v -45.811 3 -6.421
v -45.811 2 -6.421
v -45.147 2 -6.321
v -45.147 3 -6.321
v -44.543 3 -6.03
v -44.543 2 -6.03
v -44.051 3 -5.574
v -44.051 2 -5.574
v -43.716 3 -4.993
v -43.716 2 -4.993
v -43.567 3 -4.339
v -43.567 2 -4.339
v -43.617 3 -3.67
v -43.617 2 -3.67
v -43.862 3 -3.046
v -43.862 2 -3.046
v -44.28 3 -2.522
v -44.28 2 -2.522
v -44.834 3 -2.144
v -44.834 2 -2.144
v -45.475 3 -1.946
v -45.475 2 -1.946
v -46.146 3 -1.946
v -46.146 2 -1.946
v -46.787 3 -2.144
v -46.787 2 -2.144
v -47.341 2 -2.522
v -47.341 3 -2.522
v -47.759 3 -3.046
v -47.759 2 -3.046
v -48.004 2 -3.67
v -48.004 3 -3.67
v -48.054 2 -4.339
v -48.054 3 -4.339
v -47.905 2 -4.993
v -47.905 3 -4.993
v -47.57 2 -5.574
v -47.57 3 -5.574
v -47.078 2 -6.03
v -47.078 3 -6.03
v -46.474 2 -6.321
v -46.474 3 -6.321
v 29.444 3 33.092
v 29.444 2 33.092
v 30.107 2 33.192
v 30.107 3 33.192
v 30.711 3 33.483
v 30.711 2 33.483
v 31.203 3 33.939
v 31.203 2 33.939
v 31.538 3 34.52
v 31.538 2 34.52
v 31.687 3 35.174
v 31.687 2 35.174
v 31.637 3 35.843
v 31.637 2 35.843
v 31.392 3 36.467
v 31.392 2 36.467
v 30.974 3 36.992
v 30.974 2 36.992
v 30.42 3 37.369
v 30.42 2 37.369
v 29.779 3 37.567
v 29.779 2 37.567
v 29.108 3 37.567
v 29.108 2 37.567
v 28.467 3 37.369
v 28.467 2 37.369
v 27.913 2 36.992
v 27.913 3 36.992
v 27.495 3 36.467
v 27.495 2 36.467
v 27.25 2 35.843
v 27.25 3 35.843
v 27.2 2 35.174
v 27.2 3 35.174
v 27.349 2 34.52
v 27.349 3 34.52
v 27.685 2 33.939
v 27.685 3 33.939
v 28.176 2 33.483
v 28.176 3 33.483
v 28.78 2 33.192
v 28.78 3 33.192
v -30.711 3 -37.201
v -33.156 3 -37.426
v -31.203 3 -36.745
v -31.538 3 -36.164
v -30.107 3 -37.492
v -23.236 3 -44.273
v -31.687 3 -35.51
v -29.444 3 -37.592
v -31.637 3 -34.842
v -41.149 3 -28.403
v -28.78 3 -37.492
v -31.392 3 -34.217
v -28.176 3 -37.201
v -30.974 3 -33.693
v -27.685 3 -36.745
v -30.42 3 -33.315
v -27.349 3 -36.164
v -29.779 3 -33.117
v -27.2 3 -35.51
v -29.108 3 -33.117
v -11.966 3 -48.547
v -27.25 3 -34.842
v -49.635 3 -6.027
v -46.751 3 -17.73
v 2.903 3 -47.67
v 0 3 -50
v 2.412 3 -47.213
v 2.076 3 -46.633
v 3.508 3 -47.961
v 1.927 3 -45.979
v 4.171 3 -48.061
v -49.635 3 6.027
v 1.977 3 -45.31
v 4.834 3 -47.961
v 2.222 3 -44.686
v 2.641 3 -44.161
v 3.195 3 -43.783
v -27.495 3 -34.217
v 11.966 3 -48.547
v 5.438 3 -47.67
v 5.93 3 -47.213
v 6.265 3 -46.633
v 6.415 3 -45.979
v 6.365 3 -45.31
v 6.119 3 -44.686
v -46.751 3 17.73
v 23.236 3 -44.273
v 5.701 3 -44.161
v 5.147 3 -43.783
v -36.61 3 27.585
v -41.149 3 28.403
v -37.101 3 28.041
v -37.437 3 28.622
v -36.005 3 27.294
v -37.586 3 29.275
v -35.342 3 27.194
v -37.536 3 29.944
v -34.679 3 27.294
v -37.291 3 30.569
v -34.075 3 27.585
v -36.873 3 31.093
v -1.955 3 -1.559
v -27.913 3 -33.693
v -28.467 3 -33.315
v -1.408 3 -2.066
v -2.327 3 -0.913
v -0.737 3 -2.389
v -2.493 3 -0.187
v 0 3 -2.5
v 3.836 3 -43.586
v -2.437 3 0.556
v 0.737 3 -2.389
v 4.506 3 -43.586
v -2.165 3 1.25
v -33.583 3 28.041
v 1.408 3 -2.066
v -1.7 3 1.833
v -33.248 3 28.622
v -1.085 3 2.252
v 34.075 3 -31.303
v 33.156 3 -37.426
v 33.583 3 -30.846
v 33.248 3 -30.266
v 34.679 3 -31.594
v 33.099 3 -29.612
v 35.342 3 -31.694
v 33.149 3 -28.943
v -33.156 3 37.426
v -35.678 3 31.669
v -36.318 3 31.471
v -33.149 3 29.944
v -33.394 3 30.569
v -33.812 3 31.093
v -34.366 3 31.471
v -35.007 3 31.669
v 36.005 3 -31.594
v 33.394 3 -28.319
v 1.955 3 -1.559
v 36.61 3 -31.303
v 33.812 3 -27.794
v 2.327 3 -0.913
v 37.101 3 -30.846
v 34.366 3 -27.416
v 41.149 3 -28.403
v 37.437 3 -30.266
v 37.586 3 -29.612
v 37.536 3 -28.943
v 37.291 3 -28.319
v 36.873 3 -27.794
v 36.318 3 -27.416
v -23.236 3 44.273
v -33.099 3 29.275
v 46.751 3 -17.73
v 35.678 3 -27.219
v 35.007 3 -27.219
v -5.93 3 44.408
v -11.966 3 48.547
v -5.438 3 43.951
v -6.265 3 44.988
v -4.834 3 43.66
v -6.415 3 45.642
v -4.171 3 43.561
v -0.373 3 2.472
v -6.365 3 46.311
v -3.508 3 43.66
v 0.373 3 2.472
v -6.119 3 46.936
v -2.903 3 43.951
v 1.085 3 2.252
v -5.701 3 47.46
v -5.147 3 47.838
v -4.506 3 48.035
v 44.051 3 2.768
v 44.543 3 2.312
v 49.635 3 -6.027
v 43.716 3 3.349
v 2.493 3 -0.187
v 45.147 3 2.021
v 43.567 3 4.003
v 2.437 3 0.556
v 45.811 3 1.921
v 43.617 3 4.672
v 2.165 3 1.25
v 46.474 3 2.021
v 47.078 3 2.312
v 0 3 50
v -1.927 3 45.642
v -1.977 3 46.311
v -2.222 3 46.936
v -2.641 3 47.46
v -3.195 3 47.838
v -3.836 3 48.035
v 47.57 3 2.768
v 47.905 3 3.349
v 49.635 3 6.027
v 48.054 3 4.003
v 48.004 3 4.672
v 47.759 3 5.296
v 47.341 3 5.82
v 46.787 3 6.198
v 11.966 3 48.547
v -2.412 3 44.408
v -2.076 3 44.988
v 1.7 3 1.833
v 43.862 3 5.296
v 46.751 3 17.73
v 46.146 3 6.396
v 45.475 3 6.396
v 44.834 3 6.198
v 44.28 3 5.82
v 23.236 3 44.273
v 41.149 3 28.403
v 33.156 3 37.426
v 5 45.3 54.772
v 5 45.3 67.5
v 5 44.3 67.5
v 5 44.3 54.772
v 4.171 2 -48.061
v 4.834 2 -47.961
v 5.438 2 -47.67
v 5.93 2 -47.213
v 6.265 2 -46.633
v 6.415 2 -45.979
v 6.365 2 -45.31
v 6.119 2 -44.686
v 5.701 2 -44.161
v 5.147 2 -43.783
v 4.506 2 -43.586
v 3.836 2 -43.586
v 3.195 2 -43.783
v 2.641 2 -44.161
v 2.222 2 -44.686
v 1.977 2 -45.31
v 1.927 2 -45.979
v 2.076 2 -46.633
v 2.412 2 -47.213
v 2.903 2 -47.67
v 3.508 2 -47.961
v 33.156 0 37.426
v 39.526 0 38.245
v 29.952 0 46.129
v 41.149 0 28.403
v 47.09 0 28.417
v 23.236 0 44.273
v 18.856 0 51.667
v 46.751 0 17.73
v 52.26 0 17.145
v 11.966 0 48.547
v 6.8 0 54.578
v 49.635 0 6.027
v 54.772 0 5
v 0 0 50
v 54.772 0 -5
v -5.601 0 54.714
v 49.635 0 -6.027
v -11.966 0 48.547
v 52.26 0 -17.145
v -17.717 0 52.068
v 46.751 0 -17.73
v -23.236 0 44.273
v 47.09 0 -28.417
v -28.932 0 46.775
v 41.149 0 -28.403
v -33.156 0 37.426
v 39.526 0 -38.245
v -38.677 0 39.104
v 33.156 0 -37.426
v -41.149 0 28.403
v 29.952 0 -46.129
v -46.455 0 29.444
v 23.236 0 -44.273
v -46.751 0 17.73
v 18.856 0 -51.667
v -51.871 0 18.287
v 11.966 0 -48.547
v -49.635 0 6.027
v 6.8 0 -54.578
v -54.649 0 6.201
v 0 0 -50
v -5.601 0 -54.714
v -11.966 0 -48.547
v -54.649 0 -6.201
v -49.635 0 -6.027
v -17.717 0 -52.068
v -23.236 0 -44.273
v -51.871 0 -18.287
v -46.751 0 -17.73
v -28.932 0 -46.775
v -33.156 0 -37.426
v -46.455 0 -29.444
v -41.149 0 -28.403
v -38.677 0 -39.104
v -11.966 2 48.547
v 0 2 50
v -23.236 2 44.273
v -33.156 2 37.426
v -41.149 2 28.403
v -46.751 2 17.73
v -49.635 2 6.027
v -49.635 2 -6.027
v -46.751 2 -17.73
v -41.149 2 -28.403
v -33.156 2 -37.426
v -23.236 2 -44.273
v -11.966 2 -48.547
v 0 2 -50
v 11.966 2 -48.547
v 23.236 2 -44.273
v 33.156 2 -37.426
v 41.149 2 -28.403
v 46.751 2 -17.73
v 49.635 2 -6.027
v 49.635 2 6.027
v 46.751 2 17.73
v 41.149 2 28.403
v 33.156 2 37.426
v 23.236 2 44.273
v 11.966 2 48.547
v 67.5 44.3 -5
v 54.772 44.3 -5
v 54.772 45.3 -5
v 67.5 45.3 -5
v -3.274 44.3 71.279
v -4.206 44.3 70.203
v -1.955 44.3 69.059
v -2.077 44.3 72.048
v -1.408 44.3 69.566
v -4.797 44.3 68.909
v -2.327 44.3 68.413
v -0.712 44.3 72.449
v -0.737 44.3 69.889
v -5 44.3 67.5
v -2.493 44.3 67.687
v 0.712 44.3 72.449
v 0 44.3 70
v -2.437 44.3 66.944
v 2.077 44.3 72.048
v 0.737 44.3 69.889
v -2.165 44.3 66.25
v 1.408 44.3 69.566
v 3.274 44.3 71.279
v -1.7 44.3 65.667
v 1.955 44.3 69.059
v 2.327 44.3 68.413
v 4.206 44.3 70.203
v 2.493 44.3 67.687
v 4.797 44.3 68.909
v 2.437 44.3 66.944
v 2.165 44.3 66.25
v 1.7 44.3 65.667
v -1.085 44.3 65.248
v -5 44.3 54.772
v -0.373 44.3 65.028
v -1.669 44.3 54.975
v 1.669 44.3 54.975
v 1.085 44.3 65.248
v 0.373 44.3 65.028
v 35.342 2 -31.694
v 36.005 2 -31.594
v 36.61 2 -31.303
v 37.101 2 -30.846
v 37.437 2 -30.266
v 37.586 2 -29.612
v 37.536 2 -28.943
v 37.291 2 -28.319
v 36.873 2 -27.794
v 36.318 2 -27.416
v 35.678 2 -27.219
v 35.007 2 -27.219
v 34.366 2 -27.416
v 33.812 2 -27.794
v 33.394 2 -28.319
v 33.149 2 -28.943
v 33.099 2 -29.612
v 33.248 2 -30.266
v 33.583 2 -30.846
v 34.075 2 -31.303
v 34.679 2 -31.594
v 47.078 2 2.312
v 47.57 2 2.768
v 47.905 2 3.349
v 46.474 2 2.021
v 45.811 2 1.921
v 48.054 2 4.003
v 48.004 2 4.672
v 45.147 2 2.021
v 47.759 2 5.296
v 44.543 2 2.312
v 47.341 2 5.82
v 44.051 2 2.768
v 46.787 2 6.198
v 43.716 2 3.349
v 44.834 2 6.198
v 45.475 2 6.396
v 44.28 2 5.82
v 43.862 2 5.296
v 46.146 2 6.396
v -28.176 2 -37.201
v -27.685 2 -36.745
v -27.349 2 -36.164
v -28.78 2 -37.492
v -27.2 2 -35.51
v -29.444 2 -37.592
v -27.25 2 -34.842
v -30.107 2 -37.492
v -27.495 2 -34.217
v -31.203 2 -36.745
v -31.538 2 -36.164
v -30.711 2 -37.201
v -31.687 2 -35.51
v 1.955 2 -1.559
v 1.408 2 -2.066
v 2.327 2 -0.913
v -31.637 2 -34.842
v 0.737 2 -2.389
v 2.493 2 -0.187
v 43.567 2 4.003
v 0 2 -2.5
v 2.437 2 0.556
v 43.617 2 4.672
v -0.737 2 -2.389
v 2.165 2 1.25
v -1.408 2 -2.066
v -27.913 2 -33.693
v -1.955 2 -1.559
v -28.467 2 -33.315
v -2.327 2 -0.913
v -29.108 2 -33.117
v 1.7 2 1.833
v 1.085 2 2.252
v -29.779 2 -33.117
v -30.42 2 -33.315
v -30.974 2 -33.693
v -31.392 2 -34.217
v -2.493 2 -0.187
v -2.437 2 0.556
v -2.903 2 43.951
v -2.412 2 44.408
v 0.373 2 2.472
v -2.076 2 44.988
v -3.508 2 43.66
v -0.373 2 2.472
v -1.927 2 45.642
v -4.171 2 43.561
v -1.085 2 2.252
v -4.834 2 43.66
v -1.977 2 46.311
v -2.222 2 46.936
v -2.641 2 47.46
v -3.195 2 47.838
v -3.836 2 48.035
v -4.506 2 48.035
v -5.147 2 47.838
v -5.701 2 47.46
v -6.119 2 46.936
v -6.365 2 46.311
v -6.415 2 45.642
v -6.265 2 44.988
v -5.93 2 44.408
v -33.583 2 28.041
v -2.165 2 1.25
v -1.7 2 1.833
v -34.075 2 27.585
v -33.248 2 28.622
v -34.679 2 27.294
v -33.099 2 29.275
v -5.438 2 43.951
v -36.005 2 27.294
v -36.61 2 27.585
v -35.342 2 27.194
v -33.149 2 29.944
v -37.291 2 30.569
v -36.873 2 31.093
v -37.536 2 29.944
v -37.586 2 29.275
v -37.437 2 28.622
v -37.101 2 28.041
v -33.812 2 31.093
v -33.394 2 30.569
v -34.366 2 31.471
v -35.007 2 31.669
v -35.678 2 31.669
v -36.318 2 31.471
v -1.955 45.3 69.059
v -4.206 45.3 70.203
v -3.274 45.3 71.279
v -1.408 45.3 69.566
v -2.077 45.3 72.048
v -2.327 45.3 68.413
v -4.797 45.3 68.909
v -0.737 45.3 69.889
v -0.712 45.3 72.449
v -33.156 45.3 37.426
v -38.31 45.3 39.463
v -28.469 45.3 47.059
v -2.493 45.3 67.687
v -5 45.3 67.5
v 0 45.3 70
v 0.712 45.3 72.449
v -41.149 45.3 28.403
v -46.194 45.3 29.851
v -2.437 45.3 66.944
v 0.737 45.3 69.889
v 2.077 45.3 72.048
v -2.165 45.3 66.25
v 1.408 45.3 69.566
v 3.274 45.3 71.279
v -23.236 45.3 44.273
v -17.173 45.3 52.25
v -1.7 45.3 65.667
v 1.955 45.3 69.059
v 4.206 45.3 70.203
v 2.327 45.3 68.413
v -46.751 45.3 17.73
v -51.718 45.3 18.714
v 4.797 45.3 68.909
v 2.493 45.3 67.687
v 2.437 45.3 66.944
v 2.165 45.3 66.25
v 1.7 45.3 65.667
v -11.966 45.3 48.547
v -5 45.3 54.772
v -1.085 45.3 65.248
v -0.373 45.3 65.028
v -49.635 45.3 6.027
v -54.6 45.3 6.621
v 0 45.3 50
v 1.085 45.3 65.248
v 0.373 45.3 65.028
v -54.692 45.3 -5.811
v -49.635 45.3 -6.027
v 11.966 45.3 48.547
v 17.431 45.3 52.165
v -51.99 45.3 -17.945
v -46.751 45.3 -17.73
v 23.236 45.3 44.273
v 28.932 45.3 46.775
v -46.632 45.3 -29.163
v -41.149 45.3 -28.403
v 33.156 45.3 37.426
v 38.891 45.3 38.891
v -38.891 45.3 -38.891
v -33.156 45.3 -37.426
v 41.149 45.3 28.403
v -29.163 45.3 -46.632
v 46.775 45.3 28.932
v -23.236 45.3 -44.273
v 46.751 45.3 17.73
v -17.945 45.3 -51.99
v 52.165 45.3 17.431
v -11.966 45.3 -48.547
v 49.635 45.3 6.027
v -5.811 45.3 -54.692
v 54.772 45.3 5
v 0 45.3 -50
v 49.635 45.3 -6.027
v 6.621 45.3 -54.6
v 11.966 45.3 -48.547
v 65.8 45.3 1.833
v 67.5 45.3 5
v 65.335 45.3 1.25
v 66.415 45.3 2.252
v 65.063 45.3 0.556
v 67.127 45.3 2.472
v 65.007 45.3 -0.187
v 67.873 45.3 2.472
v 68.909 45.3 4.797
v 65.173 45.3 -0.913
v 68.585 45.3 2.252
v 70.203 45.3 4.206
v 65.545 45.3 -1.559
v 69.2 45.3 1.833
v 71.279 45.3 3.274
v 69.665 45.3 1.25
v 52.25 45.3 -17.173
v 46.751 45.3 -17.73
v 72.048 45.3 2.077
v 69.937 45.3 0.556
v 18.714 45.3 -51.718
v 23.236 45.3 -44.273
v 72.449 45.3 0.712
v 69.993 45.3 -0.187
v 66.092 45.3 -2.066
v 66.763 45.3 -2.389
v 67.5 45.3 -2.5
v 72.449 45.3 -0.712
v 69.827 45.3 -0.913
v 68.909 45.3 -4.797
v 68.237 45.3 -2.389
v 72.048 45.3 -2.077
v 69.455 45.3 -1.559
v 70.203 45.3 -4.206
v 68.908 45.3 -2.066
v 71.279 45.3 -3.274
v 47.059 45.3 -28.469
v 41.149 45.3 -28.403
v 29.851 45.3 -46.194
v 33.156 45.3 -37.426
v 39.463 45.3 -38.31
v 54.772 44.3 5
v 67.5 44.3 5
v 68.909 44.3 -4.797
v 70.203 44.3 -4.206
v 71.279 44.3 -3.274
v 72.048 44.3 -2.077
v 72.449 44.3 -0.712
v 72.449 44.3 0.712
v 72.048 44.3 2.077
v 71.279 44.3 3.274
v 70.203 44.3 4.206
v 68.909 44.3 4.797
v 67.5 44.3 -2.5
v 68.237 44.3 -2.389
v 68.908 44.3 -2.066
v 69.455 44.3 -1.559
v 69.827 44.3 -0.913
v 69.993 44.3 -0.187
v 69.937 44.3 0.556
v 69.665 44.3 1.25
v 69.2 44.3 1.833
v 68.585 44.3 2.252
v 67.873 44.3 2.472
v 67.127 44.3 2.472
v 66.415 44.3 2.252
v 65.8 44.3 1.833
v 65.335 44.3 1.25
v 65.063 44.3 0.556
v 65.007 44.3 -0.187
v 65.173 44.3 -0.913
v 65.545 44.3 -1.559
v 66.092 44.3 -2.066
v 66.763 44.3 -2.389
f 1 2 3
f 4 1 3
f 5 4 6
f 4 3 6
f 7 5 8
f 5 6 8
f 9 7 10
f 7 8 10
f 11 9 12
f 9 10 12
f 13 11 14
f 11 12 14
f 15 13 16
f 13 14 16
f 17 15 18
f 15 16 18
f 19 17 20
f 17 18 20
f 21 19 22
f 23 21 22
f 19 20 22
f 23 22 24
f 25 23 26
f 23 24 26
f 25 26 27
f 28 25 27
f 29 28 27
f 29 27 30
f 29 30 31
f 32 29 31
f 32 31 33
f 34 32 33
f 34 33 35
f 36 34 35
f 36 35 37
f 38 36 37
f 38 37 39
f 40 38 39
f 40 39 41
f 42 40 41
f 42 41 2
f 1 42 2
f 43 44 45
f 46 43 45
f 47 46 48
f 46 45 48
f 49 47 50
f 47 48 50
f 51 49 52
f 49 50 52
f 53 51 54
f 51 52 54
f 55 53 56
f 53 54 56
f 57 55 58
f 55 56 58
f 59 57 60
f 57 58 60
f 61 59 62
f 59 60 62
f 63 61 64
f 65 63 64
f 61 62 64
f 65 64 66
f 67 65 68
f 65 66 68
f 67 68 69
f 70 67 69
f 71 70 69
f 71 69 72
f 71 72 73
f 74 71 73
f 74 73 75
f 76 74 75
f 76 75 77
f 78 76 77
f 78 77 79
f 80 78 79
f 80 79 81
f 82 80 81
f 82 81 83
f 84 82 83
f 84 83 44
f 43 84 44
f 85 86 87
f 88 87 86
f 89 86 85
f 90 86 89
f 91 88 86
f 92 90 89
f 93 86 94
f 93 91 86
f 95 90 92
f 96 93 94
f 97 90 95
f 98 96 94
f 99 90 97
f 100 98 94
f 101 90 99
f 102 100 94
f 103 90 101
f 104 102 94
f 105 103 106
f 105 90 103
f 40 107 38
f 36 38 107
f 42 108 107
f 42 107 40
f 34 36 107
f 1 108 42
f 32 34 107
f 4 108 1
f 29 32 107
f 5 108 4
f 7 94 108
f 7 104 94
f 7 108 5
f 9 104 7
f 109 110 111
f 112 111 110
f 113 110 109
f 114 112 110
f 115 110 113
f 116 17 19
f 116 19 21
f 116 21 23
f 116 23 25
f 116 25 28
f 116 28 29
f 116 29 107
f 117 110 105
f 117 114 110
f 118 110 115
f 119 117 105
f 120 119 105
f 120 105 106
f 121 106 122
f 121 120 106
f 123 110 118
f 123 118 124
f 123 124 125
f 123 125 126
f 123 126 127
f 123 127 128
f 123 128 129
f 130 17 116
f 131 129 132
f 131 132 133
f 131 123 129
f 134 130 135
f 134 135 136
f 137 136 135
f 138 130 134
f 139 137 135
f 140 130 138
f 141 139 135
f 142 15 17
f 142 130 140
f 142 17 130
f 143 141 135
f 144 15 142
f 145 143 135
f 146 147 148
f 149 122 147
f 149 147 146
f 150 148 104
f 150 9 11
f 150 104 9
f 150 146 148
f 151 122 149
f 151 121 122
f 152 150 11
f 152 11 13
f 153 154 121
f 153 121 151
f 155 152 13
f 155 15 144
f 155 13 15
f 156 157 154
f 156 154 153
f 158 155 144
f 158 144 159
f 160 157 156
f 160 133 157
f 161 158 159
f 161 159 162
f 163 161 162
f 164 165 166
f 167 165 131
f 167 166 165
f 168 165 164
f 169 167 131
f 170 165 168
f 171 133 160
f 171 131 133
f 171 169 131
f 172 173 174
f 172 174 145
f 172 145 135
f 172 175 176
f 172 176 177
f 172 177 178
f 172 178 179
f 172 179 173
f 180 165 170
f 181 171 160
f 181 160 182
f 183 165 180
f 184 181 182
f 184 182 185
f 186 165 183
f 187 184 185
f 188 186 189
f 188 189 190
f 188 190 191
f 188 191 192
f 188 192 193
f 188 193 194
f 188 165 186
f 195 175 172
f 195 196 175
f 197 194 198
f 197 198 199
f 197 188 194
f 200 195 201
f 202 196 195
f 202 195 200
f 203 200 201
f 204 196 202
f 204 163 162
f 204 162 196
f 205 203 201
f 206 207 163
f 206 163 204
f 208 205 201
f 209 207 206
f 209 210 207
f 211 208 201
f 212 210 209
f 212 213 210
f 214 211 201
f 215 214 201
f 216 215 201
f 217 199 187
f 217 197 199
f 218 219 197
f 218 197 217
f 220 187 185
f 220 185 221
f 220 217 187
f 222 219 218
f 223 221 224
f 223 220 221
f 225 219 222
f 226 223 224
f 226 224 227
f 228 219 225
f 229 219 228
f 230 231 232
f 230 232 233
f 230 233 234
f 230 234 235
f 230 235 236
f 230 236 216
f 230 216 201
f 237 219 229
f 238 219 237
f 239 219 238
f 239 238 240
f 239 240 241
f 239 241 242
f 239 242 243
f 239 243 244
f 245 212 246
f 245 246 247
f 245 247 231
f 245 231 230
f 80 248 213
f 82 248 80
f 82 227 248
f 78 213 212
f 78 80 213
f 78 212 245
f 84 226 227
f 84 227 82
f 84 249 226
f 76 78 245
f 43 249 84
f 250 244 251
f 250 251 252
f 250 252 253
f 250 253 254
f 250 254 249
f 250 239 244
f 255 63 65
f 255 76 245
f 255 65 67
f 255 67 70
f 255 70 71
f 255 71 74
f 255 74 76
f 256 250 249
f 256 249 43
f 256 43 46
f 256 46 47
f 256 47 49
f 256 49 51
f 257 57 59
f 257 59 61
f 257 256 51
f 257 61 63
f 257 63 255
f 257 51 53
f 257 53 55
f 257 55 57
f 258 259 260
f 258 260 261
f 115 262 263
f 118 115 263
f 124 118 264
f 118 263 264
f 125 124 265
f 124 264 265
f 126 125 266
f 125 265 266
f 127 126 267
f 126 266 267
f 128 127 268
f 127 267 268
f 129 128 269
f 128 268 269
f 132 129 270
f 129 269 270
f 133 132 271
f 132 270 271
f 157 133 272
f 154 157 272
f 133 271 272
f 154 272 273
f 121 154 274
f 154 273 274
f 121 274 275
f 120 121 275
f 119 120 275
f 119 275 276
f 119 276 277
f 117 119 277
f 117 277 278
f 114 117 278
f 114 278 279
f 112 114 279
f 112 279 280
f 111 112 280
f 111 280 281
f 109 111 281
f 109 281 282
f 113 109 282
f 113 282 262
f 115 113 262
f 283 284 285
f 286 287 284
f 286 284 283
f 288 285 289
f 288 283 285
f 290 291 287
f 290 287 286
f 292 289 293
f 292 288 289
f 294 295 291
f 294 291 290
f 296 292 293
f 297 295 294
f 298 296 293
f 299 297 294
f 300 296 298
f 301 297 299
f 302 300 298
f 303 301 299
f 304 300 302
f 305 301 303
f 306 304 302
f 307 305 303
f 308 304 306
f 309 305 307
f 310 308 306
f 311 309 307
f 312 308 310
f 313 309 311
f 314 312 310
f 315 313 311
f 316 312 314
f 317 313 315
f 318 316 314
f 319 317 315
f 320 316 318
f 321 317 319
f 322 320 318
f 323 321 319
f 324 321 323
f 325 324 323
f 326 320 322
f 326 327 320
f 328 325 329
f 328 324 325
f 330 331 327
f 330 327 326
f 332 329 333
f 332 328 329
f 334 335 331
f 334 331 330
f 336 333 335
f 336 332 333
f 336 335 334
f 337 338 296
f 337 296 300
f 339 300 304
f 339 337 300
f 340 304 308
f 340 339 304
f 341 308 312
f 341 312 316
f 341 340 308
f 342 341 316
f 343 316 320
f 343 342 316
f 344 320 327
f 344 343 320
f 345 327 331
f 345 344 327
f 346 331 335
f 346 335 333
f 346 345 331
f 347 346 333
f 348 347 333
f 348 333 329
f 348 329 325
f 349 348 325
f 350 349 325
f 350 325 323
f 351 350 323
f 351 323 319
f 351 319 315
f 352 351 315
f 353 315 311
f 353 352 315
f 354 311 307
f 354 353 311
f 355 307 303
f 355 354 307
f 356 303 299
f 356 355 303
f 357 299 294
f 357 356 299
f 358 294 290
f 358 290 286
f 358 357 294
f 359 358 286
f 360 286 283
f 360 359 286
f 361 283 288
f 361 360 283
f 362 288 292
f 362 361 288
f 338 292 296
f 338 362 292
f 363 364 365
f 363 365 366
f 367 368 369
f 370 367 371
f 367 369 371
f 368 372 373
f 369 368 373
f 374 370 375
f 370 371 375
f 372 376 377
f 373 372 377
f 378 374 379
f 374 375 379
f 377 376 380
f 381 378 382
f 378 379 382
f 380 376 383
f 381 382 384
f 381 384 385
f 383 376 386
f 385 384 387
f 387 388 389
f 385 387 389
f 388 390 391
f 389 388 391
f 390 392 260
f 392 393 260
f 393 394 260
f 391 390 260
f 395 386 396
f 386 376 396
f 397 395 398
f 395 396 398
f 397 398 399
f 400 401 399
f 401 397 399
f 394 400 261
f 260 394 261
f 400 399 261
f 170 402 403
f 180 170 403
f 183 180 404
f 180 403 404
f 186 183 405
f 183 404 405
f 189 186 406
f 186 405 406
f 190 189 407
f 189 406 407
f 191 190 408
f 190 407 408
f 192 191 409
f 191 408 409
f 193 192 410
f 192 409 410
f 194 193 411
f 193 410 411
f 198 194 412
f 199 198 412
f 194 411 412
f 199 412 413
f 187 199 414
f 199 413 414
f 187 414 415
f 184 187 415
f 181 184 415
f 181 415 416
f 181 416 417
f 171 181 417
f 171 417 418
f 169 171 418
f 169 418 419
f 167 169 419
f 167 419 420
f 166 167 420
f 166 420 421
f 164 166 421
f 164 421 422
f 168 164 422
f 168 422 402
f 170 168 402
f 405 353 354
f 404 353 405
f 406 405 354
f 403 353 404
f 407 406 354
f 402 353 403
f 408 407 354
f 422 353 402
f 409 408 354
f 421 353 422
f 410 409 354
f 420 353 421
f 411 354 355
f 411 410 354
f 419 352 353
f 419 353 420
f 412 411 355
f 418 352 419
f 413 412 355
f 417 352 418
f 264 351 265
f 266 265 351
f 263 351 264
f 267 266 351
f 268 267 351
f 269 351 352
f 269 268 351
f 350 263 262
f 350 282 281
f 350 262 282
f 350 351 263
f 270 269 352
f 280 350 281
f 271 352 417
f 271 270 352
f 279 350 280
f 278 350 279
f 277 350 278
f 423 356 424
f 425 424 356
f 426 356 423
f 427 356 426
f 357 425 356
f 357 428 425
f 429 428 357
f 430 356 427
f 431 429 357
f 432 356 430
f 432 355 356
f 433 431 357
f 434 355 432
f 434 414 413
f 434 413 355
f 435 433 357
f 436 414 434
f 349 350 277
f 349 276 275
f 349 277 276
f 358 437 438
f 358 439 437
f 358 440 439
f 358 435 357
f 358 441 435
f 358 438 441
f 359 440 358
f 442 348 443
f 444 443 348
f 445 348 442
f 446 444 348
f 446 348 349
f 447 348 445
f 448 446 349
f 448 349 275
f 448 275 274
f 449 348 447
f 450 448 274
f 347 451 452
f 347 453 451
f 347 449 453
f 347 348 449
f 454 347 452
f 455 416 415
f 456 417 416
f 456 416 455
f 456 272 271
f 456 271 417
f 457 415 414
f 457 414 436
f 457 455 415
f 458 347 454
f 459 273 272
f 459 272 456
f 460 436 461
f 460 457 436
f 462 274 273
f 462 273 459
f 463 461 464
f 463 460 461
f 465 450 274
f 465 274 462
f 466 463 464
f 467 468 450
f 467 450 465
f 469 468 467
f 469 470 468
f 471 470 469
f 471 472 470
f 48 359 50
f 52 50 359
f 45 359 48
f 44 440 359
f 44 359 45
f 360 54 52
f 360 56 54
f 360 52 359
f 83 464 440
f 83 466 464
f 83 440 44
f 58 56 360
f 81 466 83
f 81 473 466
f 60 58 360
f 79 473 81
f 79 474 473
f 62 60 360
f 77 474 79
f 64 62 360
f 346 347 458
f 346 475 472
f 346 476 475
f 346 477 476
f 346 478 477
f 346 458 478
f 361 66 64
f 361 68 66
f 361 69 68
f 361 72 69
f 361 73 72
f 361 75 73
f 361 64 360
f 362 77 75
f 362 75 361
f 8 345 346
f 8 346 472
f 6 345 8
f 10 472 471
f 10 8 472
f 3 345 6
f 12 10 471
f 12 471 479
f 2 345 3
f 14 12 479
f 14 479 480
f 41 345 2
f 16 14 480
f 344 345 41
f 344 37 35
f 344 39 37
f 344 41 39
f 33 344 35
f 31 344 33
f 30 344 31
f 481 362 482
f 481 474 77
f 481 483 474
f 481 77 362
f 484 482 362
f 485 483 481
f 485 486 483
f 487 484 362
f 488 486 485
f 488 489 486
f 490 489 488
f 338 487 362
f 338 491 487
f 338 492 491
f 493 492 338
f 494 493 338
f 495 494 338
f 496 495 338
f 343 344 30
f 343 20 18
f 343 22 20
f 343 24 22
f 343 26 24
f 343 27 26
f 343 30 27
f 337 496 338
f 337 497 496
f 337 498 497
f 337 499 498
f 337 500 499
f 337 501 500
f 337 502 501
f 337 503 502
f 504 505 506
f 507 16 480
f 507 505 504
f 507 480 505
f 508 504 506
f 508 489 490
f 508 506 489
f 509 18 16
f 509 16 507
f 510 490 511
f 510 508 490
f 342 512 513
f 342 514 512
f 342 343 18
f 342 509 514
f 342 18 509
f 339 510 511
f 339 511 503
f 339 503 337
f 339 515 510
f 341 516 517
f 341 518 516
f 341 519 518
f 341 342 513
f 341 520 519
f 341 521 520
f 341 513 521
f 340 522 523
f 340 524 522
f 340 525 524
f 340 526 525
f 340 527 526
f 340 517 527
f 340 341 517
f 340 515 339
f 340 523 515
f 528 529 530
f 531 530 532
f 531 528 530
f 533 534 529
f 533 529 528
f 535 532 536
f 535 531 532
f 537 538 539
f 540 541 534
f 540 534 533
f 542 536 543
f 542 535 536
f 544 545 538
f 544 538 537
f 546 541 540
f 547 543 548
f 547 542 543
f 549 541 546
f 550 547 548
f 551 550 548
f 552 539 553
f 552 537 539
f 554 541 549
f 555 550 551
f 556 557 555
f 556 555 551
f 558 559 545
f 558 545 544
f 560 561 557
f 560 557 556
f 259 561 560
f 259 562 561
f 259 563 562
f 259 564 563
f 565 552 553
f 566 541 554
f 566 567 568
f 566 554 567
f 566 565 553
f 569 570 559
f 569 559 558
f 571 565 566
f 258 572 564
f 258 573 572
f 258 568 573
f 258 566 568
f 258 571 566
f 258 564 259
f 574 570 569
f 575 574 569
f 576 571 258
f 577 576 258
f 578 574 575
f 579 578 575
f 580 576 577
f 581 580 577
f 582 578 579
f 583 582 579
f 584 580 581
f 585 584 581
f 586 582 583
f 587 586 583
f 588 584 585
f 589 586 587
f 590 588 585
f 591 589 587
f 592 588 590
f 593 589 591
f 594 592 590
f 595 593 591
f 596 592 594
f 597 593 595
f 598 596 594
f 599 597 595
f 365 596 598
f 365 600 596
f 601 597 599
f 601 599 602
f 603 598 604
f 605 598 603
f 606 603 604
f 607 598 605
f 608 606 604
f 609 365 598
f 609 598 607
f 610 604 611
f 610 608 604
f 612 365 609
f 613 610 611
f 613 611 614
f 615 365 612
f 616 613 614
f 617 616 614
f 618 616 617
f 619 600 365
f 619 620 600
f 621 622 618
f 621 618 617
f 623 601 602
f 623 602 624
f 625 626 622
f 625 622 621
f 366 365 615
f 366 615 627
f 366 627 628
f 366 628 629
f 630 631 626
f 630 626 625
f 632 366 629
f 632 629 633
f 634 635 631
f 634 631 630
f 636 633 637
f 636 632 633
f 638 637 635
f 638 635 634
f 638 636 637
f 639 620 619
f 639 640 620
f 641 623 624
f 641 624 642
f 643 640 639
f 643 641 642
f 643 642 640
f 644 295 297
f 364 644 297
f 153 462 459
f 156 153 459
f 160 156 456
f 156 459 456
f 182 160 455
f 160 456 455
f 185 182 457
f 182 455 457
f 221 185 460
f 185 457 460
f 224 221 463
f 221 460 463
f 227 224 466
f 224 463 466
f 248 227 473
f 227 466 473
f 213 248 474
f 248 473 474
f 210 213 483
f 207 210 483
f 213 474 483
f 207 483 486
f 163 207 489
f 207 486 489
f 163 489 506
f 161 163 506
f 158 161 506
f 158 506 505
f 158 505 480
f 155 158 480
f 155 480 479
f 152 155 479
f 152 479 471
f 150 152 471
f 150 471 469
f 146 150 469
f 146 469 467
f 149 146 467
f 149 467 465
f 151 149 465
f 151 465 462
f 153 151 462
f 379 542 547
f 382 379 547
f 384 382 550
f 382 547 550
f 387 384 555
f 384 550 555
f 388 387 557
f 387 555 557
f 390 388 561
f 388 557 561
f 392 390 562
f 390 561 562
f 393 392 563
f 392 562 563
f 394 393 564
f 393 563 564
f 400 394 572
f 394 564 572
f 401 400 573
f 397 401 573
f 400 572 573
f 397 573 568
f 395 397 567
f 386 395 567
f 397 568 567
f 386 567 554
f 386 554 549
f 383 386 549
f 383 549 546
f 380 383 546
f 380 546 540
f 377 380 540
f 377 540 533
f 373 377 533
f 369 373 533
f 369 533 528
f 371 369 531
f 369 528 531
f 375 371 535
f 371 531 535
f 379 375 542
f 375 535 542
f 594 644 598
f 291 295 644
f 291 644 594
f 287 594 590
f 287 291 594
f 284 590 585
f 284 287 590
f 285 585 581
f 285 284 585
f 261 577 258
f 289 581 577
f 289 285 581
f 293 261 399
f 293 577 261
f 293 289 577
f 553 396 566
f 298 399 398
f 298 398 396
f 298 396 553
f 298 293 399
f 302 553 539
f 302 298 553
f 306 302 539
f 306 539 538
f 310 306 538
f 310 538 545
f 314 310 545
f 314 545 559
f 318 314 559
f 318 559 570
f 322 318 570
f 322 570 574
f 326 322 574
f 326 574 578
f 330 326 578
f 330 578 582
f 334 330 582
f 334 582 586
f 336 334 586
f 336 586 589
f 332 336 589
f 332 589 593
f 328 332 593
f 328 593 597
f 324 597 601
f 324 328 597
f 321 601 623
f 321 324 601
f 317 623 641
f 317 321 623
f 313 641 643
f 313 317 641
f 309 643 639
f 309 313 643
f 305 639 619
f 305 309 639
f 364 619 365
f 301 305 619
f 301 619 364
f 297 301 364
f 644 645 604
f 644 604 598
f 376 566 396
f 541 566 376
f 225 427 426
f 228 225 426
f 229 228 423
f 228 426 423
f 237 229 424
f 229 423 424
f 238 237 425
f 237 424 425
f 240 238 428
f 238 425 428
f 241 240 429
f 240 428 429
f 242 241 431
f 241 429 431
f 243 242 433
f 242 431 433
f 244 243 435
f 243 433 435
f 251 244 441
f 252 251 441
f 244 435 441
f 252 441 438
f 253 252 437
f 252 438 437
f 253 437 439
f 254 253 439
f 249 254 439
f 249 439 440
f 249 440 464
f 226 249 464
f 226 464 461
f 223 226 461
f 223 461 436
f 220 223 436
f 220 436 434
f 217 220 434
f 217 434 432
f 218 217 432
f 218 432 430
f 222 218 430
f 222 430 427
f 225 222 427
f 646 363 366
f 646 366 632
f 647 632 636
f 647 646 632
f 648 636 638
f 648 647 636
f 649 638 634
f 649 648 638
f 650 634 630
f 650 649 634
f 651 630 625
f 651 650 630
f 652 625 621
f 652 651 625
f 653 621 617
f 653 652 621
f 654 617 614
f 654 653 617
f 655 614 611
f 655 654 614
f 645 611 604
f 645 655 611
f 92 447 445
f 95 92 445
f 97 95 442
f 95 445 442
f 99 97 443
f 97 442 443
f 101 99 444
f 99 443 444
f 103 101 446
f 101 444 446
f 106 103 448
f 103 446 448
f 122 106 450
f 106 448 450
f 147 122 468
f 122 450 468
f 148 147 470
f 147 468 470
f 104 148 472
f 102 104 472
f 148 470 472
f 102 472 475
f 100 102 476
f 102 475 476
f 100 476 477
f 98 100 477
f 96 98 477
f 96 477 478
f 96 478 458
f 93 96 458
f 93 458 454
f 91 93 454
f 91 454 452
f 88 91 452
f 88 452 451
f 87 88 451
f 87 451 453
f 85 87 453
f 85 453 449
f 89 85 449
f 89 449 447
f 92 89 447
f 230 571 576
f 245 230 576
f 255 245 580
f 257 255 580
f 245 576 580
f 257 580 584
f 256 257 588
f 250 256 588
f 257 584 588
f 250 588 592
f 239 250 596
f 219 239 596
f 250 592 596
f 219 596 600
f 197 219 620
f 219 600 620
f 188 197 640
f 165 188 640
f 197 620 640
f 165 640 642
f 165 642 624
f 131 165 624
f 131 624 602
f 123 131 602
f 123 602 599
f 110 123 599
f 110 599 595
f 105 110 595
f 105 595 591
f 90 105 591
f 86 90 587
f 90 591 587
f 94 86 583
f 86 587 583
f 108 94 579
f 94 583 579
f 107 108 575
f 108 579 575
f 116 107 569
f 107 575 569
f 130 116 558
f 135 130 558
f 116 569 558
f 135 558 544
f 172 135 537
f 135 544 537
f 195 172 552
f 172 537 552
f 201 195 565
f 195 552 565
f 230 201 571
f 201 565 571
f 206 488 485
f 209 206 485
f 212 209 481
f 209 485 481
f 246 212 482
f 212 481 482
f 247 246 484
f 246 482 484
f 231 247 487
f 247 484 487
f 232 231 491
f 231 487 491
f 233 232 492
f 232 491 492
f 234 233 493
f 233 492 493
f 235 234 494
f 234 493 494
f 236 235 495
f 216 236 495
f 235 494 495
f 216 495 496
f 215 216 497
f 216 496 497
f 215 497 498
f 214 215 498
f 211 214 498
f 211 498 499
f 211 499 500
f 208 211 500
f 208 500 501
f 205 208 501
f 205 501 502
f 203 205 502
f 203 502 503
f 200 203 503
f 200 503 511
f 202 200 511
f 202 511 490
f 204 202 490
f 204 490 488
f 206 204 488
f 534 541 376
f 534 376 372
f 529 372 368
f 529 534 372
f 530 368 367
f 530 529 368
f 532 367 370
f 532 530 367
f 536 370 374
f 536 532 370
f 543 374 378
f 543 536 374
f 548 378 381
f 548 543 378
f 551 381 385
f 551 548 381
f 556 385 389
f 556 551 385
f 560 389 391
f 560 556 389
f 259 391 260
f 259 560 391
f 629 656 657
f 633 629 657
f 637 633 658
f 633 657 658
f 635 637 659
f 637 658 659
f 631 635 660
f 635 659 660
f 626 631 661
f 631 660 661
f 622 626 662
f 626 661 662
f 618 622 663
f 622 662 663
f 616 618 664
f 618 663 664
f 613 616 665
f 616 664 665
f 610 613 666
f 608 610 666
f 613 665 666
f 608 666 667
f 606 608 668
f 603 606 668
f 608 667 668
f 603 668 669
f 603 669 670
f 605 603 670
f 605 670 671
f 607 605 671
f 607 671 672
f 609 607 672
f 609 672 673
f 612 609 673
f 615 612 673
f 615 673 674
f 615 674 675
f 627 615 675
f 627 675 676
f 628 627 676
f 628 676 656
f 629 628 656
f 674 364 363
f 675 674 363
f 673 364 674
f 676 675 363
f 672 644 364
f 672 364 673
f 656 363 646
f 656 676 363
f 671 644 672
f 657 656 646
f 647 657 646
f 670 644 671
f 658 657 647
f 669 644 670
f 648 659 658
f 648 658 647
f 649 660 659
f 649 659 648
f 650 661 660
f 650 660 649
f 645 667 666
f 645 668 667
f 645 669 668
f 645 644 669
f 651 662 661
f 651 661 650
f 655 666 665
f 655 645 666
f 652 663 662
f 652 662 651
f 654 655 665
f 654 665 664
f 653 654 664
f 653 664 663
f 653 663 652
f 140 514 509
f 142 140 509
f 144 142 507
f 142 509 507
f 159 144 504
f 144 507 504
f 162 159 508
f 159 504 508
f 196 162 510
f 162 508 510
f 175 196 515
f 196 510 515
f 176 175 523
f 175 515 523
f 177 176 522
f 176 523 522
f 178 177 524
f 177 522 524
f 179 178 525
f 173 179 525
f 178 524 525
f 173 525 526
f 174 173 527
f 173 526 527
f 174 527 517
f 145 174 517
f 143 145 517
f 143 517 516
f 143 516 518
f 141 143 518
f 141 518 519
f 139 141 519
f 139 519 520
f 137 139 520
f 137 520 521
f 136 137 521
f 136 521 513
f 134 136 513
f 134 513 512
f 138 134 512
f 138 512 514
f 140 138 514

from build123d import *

# Parameters (mm, degrees)
EXTRUDE_1_DEPTH     = 45.3
SKETCH_2_R          = 50
CUT_EXTRUDE_1_DEPTH = 42.3
CUT_EXTRUDE_3_DEPTH = 44.3
CUT_EXTRUDE_START   = -2
SKETCH_5_R          = 50
CUT_EXTRUDE_4_DEPTH = 2
SKETCH_6_R          = 2.25
CUT_EXTRUDE_5_DEPTH = 101.777676099
SKETCH_7_R          = 2.5
CUT_EXTRUDE_6_DEPTH = 101.777676099
SKETCH_8_R          = 2.5
CUT_EXTRUDE_7_DEPTH = 102.211362998
EXTRUDE_2_DEPTH     = 1
SKETCH_10_R         = 2.5
CUT_EXTRUDE_8_DEPTH = 1


with BuildPart() as part:
    # 草图1 → 凸台-拉伸1 (new body)
    with BuildSketch(Plane(origin=(0, 0, 0), x_dir=(1, 0, 0), z_dir=(0, 1, 0))):
        with BuildLine():
            Line((54.772255751, 5), (67.5, 5))
            ThreePointArc((67.5, 5), (72.5, 0), (67.5, -5))
            Line((67.5, -5), (54.772255751, -5))
            ThreePointArc((54.772255751, -5), (-55, 0), (54.772255751, 5))
        make_face()
    extrude(amount=EXTRUDE_1_DEPTH)

    # 草图2 → 切除-拉伸1 (cut)
    with BuildSketch(Plane(origin=(0, 45.3, 0), x_dir=(1, 0, 0), z_dir=(0, 1, 0))):
        with Locations(Location((0, 0, 0), (0, 0, 270))):
            Circle(SKETCH_2_R)
    extrude(amount=-CUT_EXTRUDE_1_DEPTH, mode=Mode.SUBTRACT)

    # 草图4 → 切除-拉伸3 (cut)
    with BuildSketch(Plane.XZ):
        with BuildLine():
            Line((67.5, 5), (67.5, -5))
            ThreePointArc((67.5, -5), (72.5, 0), (67.5, 5))
        make_face()
        with BuildLine():
            ThreePointArc((72.5, 0), (71.035533906, 3.535533906), (67.5, 5))
            Line((67.5, 5), (67.5, -5))
            ThreePointArc((67.5, -5), (71.035533906, -3.535533906), (72.5, 0))
        make_face()
        with BuildLine():
            Line((67.5, -5), (67.5, 5))
            ThreePointArc((67.5, 5), (62.5, 0), (67.5, -5))
        make_face()
        with BuildLine():
            Line((67.5, 5), (54.772255751, 5))
            Line((54.772255751, 5), (54.772255751, -5))
            Line((54.772255751, -5), (67.5, -5))
            ThreePointArc((67.5, -5), (62.5, 0), (67.5, 5))
        make_face()
    extrude(amount=-CUT_EXTRUDE_3_DEPTH, mode=Mode.SUBTRACT)

    # 草图5 → 切除-拉伸4 (cut)
    with BuildSketch(Plane.XZ.offset(CUT_EXTRUDE_START)):
        with Locations(Location((0, 0, 0), (0, 0, 90))):
            Circle(SKETCH_5_R)
    extrude(amount=CUT_EXTRUDE_4_DEPTH, mode=Mode.SUBTRACT)

    # 草图6 → 切除-拉伸5 (cut, through all)
    with BuildSketch(Plane(origin=(0, 2, 0), x_dir=(-1, 0, 0), z_dir=(0, -1, 0))):
        with Locations(Location((-4.170920038, 45.810516544, 0), (0, 0, 90))):
            Circle(SKETCH_6_R)
        with Locations(Location((29.443641055, 35.342212741, 0), (0, 0, 90))):
            Circle(SKETCH_6_R)
        with Locations(Location((45.810516544, 4.170920038, 0), (0, 0, 90))):
            Circle(SKETCH_6_R)
        with Locations(Location((35.342212741, -29.443641055, 0), (0, 0, 90))):
            Circle(SKETCH_6_R)
        with Locations(Location((4.170920038, -45.810516544, 0), (0, 0, 90))):
            Circle(SKETCH_6_R)
        with Locations(Location((-29.443641055, -35.342212741, 0), (0, 0, 90))):
            Circle(SKETCH_6_R)
        with Locations(Location((-45.810516544, -4.170920038, 0), (0, 0, 90))):
            Circle(SKETCH_6_R)
        with Locations(Location((-35.342212741, 29.443641055, 0), (0, 0, 90))):
            Circle(SKETCH_6_R)
    extrude(amount=-CUT_EXTRUDE_5_DEPTH, mode=Mode.SUBTRACT)

    # 草图7 → 切除-拉伸6 (cut, through all)
    with BuildSketch(Plane.XZ.offset(-2)):
        with Locations(Location((0, 0, 0), (0, 0, 270))):
            Circle(SKETCH_7_R)
    extrude(amount=-CUT_EXTRUDE_6_DEPTH, mode=Mode.SUBTRACT)

    # 草图8 → 切除-拉伸7 (cut, through all)
    with BuildSketch(Plane.XZ.offset(-44.3)):
        with Locations(Location((67.5, 0, 0), (0, 0, 270))):
            Circle(SKETCH_8_R)
    extrude(amount=-CUT_EXTRUDE_7_DEPTH, mode=Mode.SUBTRACT)

    # 草图9 → 凸台-拉伸2 (add)
    with BuildSketch(Plane(origin=(0, 45.3, 0), x_dir=(1, 0, 0), z_dir=(0, 1, 0))):
        with BuildLine():
            Line((5, -67.5), (5, -54.718723613))
            Line((5, -54.718723613), (0, -55))
            Line((0, -55), (-5, -54.718723613))
            Line((-5, -54.718723613), (-5, -67.5))
            ThreePointArc((-5, -67.5), (0, -72.5), (5, -67.5))
        make_face()
    extrude(amount=-EXTRUDE_2_DEPTH)

    # 草图10 → 切除-拉伸8 (cut)
    with BuildSketch(Plane(origin=(0, 45.3, 0), x_dir=(1, 0, 0), z_dir=(0, 1, 0))):
        with Locations(Location((0, -67.5, 0), (0, 0, 270))):
            Circle(SKETCH_10_R)
    extrude(amount=-CUT_EXTRUDE_8_DEPTH, mode=Mode.SUBTRACT)


solid = part.part
